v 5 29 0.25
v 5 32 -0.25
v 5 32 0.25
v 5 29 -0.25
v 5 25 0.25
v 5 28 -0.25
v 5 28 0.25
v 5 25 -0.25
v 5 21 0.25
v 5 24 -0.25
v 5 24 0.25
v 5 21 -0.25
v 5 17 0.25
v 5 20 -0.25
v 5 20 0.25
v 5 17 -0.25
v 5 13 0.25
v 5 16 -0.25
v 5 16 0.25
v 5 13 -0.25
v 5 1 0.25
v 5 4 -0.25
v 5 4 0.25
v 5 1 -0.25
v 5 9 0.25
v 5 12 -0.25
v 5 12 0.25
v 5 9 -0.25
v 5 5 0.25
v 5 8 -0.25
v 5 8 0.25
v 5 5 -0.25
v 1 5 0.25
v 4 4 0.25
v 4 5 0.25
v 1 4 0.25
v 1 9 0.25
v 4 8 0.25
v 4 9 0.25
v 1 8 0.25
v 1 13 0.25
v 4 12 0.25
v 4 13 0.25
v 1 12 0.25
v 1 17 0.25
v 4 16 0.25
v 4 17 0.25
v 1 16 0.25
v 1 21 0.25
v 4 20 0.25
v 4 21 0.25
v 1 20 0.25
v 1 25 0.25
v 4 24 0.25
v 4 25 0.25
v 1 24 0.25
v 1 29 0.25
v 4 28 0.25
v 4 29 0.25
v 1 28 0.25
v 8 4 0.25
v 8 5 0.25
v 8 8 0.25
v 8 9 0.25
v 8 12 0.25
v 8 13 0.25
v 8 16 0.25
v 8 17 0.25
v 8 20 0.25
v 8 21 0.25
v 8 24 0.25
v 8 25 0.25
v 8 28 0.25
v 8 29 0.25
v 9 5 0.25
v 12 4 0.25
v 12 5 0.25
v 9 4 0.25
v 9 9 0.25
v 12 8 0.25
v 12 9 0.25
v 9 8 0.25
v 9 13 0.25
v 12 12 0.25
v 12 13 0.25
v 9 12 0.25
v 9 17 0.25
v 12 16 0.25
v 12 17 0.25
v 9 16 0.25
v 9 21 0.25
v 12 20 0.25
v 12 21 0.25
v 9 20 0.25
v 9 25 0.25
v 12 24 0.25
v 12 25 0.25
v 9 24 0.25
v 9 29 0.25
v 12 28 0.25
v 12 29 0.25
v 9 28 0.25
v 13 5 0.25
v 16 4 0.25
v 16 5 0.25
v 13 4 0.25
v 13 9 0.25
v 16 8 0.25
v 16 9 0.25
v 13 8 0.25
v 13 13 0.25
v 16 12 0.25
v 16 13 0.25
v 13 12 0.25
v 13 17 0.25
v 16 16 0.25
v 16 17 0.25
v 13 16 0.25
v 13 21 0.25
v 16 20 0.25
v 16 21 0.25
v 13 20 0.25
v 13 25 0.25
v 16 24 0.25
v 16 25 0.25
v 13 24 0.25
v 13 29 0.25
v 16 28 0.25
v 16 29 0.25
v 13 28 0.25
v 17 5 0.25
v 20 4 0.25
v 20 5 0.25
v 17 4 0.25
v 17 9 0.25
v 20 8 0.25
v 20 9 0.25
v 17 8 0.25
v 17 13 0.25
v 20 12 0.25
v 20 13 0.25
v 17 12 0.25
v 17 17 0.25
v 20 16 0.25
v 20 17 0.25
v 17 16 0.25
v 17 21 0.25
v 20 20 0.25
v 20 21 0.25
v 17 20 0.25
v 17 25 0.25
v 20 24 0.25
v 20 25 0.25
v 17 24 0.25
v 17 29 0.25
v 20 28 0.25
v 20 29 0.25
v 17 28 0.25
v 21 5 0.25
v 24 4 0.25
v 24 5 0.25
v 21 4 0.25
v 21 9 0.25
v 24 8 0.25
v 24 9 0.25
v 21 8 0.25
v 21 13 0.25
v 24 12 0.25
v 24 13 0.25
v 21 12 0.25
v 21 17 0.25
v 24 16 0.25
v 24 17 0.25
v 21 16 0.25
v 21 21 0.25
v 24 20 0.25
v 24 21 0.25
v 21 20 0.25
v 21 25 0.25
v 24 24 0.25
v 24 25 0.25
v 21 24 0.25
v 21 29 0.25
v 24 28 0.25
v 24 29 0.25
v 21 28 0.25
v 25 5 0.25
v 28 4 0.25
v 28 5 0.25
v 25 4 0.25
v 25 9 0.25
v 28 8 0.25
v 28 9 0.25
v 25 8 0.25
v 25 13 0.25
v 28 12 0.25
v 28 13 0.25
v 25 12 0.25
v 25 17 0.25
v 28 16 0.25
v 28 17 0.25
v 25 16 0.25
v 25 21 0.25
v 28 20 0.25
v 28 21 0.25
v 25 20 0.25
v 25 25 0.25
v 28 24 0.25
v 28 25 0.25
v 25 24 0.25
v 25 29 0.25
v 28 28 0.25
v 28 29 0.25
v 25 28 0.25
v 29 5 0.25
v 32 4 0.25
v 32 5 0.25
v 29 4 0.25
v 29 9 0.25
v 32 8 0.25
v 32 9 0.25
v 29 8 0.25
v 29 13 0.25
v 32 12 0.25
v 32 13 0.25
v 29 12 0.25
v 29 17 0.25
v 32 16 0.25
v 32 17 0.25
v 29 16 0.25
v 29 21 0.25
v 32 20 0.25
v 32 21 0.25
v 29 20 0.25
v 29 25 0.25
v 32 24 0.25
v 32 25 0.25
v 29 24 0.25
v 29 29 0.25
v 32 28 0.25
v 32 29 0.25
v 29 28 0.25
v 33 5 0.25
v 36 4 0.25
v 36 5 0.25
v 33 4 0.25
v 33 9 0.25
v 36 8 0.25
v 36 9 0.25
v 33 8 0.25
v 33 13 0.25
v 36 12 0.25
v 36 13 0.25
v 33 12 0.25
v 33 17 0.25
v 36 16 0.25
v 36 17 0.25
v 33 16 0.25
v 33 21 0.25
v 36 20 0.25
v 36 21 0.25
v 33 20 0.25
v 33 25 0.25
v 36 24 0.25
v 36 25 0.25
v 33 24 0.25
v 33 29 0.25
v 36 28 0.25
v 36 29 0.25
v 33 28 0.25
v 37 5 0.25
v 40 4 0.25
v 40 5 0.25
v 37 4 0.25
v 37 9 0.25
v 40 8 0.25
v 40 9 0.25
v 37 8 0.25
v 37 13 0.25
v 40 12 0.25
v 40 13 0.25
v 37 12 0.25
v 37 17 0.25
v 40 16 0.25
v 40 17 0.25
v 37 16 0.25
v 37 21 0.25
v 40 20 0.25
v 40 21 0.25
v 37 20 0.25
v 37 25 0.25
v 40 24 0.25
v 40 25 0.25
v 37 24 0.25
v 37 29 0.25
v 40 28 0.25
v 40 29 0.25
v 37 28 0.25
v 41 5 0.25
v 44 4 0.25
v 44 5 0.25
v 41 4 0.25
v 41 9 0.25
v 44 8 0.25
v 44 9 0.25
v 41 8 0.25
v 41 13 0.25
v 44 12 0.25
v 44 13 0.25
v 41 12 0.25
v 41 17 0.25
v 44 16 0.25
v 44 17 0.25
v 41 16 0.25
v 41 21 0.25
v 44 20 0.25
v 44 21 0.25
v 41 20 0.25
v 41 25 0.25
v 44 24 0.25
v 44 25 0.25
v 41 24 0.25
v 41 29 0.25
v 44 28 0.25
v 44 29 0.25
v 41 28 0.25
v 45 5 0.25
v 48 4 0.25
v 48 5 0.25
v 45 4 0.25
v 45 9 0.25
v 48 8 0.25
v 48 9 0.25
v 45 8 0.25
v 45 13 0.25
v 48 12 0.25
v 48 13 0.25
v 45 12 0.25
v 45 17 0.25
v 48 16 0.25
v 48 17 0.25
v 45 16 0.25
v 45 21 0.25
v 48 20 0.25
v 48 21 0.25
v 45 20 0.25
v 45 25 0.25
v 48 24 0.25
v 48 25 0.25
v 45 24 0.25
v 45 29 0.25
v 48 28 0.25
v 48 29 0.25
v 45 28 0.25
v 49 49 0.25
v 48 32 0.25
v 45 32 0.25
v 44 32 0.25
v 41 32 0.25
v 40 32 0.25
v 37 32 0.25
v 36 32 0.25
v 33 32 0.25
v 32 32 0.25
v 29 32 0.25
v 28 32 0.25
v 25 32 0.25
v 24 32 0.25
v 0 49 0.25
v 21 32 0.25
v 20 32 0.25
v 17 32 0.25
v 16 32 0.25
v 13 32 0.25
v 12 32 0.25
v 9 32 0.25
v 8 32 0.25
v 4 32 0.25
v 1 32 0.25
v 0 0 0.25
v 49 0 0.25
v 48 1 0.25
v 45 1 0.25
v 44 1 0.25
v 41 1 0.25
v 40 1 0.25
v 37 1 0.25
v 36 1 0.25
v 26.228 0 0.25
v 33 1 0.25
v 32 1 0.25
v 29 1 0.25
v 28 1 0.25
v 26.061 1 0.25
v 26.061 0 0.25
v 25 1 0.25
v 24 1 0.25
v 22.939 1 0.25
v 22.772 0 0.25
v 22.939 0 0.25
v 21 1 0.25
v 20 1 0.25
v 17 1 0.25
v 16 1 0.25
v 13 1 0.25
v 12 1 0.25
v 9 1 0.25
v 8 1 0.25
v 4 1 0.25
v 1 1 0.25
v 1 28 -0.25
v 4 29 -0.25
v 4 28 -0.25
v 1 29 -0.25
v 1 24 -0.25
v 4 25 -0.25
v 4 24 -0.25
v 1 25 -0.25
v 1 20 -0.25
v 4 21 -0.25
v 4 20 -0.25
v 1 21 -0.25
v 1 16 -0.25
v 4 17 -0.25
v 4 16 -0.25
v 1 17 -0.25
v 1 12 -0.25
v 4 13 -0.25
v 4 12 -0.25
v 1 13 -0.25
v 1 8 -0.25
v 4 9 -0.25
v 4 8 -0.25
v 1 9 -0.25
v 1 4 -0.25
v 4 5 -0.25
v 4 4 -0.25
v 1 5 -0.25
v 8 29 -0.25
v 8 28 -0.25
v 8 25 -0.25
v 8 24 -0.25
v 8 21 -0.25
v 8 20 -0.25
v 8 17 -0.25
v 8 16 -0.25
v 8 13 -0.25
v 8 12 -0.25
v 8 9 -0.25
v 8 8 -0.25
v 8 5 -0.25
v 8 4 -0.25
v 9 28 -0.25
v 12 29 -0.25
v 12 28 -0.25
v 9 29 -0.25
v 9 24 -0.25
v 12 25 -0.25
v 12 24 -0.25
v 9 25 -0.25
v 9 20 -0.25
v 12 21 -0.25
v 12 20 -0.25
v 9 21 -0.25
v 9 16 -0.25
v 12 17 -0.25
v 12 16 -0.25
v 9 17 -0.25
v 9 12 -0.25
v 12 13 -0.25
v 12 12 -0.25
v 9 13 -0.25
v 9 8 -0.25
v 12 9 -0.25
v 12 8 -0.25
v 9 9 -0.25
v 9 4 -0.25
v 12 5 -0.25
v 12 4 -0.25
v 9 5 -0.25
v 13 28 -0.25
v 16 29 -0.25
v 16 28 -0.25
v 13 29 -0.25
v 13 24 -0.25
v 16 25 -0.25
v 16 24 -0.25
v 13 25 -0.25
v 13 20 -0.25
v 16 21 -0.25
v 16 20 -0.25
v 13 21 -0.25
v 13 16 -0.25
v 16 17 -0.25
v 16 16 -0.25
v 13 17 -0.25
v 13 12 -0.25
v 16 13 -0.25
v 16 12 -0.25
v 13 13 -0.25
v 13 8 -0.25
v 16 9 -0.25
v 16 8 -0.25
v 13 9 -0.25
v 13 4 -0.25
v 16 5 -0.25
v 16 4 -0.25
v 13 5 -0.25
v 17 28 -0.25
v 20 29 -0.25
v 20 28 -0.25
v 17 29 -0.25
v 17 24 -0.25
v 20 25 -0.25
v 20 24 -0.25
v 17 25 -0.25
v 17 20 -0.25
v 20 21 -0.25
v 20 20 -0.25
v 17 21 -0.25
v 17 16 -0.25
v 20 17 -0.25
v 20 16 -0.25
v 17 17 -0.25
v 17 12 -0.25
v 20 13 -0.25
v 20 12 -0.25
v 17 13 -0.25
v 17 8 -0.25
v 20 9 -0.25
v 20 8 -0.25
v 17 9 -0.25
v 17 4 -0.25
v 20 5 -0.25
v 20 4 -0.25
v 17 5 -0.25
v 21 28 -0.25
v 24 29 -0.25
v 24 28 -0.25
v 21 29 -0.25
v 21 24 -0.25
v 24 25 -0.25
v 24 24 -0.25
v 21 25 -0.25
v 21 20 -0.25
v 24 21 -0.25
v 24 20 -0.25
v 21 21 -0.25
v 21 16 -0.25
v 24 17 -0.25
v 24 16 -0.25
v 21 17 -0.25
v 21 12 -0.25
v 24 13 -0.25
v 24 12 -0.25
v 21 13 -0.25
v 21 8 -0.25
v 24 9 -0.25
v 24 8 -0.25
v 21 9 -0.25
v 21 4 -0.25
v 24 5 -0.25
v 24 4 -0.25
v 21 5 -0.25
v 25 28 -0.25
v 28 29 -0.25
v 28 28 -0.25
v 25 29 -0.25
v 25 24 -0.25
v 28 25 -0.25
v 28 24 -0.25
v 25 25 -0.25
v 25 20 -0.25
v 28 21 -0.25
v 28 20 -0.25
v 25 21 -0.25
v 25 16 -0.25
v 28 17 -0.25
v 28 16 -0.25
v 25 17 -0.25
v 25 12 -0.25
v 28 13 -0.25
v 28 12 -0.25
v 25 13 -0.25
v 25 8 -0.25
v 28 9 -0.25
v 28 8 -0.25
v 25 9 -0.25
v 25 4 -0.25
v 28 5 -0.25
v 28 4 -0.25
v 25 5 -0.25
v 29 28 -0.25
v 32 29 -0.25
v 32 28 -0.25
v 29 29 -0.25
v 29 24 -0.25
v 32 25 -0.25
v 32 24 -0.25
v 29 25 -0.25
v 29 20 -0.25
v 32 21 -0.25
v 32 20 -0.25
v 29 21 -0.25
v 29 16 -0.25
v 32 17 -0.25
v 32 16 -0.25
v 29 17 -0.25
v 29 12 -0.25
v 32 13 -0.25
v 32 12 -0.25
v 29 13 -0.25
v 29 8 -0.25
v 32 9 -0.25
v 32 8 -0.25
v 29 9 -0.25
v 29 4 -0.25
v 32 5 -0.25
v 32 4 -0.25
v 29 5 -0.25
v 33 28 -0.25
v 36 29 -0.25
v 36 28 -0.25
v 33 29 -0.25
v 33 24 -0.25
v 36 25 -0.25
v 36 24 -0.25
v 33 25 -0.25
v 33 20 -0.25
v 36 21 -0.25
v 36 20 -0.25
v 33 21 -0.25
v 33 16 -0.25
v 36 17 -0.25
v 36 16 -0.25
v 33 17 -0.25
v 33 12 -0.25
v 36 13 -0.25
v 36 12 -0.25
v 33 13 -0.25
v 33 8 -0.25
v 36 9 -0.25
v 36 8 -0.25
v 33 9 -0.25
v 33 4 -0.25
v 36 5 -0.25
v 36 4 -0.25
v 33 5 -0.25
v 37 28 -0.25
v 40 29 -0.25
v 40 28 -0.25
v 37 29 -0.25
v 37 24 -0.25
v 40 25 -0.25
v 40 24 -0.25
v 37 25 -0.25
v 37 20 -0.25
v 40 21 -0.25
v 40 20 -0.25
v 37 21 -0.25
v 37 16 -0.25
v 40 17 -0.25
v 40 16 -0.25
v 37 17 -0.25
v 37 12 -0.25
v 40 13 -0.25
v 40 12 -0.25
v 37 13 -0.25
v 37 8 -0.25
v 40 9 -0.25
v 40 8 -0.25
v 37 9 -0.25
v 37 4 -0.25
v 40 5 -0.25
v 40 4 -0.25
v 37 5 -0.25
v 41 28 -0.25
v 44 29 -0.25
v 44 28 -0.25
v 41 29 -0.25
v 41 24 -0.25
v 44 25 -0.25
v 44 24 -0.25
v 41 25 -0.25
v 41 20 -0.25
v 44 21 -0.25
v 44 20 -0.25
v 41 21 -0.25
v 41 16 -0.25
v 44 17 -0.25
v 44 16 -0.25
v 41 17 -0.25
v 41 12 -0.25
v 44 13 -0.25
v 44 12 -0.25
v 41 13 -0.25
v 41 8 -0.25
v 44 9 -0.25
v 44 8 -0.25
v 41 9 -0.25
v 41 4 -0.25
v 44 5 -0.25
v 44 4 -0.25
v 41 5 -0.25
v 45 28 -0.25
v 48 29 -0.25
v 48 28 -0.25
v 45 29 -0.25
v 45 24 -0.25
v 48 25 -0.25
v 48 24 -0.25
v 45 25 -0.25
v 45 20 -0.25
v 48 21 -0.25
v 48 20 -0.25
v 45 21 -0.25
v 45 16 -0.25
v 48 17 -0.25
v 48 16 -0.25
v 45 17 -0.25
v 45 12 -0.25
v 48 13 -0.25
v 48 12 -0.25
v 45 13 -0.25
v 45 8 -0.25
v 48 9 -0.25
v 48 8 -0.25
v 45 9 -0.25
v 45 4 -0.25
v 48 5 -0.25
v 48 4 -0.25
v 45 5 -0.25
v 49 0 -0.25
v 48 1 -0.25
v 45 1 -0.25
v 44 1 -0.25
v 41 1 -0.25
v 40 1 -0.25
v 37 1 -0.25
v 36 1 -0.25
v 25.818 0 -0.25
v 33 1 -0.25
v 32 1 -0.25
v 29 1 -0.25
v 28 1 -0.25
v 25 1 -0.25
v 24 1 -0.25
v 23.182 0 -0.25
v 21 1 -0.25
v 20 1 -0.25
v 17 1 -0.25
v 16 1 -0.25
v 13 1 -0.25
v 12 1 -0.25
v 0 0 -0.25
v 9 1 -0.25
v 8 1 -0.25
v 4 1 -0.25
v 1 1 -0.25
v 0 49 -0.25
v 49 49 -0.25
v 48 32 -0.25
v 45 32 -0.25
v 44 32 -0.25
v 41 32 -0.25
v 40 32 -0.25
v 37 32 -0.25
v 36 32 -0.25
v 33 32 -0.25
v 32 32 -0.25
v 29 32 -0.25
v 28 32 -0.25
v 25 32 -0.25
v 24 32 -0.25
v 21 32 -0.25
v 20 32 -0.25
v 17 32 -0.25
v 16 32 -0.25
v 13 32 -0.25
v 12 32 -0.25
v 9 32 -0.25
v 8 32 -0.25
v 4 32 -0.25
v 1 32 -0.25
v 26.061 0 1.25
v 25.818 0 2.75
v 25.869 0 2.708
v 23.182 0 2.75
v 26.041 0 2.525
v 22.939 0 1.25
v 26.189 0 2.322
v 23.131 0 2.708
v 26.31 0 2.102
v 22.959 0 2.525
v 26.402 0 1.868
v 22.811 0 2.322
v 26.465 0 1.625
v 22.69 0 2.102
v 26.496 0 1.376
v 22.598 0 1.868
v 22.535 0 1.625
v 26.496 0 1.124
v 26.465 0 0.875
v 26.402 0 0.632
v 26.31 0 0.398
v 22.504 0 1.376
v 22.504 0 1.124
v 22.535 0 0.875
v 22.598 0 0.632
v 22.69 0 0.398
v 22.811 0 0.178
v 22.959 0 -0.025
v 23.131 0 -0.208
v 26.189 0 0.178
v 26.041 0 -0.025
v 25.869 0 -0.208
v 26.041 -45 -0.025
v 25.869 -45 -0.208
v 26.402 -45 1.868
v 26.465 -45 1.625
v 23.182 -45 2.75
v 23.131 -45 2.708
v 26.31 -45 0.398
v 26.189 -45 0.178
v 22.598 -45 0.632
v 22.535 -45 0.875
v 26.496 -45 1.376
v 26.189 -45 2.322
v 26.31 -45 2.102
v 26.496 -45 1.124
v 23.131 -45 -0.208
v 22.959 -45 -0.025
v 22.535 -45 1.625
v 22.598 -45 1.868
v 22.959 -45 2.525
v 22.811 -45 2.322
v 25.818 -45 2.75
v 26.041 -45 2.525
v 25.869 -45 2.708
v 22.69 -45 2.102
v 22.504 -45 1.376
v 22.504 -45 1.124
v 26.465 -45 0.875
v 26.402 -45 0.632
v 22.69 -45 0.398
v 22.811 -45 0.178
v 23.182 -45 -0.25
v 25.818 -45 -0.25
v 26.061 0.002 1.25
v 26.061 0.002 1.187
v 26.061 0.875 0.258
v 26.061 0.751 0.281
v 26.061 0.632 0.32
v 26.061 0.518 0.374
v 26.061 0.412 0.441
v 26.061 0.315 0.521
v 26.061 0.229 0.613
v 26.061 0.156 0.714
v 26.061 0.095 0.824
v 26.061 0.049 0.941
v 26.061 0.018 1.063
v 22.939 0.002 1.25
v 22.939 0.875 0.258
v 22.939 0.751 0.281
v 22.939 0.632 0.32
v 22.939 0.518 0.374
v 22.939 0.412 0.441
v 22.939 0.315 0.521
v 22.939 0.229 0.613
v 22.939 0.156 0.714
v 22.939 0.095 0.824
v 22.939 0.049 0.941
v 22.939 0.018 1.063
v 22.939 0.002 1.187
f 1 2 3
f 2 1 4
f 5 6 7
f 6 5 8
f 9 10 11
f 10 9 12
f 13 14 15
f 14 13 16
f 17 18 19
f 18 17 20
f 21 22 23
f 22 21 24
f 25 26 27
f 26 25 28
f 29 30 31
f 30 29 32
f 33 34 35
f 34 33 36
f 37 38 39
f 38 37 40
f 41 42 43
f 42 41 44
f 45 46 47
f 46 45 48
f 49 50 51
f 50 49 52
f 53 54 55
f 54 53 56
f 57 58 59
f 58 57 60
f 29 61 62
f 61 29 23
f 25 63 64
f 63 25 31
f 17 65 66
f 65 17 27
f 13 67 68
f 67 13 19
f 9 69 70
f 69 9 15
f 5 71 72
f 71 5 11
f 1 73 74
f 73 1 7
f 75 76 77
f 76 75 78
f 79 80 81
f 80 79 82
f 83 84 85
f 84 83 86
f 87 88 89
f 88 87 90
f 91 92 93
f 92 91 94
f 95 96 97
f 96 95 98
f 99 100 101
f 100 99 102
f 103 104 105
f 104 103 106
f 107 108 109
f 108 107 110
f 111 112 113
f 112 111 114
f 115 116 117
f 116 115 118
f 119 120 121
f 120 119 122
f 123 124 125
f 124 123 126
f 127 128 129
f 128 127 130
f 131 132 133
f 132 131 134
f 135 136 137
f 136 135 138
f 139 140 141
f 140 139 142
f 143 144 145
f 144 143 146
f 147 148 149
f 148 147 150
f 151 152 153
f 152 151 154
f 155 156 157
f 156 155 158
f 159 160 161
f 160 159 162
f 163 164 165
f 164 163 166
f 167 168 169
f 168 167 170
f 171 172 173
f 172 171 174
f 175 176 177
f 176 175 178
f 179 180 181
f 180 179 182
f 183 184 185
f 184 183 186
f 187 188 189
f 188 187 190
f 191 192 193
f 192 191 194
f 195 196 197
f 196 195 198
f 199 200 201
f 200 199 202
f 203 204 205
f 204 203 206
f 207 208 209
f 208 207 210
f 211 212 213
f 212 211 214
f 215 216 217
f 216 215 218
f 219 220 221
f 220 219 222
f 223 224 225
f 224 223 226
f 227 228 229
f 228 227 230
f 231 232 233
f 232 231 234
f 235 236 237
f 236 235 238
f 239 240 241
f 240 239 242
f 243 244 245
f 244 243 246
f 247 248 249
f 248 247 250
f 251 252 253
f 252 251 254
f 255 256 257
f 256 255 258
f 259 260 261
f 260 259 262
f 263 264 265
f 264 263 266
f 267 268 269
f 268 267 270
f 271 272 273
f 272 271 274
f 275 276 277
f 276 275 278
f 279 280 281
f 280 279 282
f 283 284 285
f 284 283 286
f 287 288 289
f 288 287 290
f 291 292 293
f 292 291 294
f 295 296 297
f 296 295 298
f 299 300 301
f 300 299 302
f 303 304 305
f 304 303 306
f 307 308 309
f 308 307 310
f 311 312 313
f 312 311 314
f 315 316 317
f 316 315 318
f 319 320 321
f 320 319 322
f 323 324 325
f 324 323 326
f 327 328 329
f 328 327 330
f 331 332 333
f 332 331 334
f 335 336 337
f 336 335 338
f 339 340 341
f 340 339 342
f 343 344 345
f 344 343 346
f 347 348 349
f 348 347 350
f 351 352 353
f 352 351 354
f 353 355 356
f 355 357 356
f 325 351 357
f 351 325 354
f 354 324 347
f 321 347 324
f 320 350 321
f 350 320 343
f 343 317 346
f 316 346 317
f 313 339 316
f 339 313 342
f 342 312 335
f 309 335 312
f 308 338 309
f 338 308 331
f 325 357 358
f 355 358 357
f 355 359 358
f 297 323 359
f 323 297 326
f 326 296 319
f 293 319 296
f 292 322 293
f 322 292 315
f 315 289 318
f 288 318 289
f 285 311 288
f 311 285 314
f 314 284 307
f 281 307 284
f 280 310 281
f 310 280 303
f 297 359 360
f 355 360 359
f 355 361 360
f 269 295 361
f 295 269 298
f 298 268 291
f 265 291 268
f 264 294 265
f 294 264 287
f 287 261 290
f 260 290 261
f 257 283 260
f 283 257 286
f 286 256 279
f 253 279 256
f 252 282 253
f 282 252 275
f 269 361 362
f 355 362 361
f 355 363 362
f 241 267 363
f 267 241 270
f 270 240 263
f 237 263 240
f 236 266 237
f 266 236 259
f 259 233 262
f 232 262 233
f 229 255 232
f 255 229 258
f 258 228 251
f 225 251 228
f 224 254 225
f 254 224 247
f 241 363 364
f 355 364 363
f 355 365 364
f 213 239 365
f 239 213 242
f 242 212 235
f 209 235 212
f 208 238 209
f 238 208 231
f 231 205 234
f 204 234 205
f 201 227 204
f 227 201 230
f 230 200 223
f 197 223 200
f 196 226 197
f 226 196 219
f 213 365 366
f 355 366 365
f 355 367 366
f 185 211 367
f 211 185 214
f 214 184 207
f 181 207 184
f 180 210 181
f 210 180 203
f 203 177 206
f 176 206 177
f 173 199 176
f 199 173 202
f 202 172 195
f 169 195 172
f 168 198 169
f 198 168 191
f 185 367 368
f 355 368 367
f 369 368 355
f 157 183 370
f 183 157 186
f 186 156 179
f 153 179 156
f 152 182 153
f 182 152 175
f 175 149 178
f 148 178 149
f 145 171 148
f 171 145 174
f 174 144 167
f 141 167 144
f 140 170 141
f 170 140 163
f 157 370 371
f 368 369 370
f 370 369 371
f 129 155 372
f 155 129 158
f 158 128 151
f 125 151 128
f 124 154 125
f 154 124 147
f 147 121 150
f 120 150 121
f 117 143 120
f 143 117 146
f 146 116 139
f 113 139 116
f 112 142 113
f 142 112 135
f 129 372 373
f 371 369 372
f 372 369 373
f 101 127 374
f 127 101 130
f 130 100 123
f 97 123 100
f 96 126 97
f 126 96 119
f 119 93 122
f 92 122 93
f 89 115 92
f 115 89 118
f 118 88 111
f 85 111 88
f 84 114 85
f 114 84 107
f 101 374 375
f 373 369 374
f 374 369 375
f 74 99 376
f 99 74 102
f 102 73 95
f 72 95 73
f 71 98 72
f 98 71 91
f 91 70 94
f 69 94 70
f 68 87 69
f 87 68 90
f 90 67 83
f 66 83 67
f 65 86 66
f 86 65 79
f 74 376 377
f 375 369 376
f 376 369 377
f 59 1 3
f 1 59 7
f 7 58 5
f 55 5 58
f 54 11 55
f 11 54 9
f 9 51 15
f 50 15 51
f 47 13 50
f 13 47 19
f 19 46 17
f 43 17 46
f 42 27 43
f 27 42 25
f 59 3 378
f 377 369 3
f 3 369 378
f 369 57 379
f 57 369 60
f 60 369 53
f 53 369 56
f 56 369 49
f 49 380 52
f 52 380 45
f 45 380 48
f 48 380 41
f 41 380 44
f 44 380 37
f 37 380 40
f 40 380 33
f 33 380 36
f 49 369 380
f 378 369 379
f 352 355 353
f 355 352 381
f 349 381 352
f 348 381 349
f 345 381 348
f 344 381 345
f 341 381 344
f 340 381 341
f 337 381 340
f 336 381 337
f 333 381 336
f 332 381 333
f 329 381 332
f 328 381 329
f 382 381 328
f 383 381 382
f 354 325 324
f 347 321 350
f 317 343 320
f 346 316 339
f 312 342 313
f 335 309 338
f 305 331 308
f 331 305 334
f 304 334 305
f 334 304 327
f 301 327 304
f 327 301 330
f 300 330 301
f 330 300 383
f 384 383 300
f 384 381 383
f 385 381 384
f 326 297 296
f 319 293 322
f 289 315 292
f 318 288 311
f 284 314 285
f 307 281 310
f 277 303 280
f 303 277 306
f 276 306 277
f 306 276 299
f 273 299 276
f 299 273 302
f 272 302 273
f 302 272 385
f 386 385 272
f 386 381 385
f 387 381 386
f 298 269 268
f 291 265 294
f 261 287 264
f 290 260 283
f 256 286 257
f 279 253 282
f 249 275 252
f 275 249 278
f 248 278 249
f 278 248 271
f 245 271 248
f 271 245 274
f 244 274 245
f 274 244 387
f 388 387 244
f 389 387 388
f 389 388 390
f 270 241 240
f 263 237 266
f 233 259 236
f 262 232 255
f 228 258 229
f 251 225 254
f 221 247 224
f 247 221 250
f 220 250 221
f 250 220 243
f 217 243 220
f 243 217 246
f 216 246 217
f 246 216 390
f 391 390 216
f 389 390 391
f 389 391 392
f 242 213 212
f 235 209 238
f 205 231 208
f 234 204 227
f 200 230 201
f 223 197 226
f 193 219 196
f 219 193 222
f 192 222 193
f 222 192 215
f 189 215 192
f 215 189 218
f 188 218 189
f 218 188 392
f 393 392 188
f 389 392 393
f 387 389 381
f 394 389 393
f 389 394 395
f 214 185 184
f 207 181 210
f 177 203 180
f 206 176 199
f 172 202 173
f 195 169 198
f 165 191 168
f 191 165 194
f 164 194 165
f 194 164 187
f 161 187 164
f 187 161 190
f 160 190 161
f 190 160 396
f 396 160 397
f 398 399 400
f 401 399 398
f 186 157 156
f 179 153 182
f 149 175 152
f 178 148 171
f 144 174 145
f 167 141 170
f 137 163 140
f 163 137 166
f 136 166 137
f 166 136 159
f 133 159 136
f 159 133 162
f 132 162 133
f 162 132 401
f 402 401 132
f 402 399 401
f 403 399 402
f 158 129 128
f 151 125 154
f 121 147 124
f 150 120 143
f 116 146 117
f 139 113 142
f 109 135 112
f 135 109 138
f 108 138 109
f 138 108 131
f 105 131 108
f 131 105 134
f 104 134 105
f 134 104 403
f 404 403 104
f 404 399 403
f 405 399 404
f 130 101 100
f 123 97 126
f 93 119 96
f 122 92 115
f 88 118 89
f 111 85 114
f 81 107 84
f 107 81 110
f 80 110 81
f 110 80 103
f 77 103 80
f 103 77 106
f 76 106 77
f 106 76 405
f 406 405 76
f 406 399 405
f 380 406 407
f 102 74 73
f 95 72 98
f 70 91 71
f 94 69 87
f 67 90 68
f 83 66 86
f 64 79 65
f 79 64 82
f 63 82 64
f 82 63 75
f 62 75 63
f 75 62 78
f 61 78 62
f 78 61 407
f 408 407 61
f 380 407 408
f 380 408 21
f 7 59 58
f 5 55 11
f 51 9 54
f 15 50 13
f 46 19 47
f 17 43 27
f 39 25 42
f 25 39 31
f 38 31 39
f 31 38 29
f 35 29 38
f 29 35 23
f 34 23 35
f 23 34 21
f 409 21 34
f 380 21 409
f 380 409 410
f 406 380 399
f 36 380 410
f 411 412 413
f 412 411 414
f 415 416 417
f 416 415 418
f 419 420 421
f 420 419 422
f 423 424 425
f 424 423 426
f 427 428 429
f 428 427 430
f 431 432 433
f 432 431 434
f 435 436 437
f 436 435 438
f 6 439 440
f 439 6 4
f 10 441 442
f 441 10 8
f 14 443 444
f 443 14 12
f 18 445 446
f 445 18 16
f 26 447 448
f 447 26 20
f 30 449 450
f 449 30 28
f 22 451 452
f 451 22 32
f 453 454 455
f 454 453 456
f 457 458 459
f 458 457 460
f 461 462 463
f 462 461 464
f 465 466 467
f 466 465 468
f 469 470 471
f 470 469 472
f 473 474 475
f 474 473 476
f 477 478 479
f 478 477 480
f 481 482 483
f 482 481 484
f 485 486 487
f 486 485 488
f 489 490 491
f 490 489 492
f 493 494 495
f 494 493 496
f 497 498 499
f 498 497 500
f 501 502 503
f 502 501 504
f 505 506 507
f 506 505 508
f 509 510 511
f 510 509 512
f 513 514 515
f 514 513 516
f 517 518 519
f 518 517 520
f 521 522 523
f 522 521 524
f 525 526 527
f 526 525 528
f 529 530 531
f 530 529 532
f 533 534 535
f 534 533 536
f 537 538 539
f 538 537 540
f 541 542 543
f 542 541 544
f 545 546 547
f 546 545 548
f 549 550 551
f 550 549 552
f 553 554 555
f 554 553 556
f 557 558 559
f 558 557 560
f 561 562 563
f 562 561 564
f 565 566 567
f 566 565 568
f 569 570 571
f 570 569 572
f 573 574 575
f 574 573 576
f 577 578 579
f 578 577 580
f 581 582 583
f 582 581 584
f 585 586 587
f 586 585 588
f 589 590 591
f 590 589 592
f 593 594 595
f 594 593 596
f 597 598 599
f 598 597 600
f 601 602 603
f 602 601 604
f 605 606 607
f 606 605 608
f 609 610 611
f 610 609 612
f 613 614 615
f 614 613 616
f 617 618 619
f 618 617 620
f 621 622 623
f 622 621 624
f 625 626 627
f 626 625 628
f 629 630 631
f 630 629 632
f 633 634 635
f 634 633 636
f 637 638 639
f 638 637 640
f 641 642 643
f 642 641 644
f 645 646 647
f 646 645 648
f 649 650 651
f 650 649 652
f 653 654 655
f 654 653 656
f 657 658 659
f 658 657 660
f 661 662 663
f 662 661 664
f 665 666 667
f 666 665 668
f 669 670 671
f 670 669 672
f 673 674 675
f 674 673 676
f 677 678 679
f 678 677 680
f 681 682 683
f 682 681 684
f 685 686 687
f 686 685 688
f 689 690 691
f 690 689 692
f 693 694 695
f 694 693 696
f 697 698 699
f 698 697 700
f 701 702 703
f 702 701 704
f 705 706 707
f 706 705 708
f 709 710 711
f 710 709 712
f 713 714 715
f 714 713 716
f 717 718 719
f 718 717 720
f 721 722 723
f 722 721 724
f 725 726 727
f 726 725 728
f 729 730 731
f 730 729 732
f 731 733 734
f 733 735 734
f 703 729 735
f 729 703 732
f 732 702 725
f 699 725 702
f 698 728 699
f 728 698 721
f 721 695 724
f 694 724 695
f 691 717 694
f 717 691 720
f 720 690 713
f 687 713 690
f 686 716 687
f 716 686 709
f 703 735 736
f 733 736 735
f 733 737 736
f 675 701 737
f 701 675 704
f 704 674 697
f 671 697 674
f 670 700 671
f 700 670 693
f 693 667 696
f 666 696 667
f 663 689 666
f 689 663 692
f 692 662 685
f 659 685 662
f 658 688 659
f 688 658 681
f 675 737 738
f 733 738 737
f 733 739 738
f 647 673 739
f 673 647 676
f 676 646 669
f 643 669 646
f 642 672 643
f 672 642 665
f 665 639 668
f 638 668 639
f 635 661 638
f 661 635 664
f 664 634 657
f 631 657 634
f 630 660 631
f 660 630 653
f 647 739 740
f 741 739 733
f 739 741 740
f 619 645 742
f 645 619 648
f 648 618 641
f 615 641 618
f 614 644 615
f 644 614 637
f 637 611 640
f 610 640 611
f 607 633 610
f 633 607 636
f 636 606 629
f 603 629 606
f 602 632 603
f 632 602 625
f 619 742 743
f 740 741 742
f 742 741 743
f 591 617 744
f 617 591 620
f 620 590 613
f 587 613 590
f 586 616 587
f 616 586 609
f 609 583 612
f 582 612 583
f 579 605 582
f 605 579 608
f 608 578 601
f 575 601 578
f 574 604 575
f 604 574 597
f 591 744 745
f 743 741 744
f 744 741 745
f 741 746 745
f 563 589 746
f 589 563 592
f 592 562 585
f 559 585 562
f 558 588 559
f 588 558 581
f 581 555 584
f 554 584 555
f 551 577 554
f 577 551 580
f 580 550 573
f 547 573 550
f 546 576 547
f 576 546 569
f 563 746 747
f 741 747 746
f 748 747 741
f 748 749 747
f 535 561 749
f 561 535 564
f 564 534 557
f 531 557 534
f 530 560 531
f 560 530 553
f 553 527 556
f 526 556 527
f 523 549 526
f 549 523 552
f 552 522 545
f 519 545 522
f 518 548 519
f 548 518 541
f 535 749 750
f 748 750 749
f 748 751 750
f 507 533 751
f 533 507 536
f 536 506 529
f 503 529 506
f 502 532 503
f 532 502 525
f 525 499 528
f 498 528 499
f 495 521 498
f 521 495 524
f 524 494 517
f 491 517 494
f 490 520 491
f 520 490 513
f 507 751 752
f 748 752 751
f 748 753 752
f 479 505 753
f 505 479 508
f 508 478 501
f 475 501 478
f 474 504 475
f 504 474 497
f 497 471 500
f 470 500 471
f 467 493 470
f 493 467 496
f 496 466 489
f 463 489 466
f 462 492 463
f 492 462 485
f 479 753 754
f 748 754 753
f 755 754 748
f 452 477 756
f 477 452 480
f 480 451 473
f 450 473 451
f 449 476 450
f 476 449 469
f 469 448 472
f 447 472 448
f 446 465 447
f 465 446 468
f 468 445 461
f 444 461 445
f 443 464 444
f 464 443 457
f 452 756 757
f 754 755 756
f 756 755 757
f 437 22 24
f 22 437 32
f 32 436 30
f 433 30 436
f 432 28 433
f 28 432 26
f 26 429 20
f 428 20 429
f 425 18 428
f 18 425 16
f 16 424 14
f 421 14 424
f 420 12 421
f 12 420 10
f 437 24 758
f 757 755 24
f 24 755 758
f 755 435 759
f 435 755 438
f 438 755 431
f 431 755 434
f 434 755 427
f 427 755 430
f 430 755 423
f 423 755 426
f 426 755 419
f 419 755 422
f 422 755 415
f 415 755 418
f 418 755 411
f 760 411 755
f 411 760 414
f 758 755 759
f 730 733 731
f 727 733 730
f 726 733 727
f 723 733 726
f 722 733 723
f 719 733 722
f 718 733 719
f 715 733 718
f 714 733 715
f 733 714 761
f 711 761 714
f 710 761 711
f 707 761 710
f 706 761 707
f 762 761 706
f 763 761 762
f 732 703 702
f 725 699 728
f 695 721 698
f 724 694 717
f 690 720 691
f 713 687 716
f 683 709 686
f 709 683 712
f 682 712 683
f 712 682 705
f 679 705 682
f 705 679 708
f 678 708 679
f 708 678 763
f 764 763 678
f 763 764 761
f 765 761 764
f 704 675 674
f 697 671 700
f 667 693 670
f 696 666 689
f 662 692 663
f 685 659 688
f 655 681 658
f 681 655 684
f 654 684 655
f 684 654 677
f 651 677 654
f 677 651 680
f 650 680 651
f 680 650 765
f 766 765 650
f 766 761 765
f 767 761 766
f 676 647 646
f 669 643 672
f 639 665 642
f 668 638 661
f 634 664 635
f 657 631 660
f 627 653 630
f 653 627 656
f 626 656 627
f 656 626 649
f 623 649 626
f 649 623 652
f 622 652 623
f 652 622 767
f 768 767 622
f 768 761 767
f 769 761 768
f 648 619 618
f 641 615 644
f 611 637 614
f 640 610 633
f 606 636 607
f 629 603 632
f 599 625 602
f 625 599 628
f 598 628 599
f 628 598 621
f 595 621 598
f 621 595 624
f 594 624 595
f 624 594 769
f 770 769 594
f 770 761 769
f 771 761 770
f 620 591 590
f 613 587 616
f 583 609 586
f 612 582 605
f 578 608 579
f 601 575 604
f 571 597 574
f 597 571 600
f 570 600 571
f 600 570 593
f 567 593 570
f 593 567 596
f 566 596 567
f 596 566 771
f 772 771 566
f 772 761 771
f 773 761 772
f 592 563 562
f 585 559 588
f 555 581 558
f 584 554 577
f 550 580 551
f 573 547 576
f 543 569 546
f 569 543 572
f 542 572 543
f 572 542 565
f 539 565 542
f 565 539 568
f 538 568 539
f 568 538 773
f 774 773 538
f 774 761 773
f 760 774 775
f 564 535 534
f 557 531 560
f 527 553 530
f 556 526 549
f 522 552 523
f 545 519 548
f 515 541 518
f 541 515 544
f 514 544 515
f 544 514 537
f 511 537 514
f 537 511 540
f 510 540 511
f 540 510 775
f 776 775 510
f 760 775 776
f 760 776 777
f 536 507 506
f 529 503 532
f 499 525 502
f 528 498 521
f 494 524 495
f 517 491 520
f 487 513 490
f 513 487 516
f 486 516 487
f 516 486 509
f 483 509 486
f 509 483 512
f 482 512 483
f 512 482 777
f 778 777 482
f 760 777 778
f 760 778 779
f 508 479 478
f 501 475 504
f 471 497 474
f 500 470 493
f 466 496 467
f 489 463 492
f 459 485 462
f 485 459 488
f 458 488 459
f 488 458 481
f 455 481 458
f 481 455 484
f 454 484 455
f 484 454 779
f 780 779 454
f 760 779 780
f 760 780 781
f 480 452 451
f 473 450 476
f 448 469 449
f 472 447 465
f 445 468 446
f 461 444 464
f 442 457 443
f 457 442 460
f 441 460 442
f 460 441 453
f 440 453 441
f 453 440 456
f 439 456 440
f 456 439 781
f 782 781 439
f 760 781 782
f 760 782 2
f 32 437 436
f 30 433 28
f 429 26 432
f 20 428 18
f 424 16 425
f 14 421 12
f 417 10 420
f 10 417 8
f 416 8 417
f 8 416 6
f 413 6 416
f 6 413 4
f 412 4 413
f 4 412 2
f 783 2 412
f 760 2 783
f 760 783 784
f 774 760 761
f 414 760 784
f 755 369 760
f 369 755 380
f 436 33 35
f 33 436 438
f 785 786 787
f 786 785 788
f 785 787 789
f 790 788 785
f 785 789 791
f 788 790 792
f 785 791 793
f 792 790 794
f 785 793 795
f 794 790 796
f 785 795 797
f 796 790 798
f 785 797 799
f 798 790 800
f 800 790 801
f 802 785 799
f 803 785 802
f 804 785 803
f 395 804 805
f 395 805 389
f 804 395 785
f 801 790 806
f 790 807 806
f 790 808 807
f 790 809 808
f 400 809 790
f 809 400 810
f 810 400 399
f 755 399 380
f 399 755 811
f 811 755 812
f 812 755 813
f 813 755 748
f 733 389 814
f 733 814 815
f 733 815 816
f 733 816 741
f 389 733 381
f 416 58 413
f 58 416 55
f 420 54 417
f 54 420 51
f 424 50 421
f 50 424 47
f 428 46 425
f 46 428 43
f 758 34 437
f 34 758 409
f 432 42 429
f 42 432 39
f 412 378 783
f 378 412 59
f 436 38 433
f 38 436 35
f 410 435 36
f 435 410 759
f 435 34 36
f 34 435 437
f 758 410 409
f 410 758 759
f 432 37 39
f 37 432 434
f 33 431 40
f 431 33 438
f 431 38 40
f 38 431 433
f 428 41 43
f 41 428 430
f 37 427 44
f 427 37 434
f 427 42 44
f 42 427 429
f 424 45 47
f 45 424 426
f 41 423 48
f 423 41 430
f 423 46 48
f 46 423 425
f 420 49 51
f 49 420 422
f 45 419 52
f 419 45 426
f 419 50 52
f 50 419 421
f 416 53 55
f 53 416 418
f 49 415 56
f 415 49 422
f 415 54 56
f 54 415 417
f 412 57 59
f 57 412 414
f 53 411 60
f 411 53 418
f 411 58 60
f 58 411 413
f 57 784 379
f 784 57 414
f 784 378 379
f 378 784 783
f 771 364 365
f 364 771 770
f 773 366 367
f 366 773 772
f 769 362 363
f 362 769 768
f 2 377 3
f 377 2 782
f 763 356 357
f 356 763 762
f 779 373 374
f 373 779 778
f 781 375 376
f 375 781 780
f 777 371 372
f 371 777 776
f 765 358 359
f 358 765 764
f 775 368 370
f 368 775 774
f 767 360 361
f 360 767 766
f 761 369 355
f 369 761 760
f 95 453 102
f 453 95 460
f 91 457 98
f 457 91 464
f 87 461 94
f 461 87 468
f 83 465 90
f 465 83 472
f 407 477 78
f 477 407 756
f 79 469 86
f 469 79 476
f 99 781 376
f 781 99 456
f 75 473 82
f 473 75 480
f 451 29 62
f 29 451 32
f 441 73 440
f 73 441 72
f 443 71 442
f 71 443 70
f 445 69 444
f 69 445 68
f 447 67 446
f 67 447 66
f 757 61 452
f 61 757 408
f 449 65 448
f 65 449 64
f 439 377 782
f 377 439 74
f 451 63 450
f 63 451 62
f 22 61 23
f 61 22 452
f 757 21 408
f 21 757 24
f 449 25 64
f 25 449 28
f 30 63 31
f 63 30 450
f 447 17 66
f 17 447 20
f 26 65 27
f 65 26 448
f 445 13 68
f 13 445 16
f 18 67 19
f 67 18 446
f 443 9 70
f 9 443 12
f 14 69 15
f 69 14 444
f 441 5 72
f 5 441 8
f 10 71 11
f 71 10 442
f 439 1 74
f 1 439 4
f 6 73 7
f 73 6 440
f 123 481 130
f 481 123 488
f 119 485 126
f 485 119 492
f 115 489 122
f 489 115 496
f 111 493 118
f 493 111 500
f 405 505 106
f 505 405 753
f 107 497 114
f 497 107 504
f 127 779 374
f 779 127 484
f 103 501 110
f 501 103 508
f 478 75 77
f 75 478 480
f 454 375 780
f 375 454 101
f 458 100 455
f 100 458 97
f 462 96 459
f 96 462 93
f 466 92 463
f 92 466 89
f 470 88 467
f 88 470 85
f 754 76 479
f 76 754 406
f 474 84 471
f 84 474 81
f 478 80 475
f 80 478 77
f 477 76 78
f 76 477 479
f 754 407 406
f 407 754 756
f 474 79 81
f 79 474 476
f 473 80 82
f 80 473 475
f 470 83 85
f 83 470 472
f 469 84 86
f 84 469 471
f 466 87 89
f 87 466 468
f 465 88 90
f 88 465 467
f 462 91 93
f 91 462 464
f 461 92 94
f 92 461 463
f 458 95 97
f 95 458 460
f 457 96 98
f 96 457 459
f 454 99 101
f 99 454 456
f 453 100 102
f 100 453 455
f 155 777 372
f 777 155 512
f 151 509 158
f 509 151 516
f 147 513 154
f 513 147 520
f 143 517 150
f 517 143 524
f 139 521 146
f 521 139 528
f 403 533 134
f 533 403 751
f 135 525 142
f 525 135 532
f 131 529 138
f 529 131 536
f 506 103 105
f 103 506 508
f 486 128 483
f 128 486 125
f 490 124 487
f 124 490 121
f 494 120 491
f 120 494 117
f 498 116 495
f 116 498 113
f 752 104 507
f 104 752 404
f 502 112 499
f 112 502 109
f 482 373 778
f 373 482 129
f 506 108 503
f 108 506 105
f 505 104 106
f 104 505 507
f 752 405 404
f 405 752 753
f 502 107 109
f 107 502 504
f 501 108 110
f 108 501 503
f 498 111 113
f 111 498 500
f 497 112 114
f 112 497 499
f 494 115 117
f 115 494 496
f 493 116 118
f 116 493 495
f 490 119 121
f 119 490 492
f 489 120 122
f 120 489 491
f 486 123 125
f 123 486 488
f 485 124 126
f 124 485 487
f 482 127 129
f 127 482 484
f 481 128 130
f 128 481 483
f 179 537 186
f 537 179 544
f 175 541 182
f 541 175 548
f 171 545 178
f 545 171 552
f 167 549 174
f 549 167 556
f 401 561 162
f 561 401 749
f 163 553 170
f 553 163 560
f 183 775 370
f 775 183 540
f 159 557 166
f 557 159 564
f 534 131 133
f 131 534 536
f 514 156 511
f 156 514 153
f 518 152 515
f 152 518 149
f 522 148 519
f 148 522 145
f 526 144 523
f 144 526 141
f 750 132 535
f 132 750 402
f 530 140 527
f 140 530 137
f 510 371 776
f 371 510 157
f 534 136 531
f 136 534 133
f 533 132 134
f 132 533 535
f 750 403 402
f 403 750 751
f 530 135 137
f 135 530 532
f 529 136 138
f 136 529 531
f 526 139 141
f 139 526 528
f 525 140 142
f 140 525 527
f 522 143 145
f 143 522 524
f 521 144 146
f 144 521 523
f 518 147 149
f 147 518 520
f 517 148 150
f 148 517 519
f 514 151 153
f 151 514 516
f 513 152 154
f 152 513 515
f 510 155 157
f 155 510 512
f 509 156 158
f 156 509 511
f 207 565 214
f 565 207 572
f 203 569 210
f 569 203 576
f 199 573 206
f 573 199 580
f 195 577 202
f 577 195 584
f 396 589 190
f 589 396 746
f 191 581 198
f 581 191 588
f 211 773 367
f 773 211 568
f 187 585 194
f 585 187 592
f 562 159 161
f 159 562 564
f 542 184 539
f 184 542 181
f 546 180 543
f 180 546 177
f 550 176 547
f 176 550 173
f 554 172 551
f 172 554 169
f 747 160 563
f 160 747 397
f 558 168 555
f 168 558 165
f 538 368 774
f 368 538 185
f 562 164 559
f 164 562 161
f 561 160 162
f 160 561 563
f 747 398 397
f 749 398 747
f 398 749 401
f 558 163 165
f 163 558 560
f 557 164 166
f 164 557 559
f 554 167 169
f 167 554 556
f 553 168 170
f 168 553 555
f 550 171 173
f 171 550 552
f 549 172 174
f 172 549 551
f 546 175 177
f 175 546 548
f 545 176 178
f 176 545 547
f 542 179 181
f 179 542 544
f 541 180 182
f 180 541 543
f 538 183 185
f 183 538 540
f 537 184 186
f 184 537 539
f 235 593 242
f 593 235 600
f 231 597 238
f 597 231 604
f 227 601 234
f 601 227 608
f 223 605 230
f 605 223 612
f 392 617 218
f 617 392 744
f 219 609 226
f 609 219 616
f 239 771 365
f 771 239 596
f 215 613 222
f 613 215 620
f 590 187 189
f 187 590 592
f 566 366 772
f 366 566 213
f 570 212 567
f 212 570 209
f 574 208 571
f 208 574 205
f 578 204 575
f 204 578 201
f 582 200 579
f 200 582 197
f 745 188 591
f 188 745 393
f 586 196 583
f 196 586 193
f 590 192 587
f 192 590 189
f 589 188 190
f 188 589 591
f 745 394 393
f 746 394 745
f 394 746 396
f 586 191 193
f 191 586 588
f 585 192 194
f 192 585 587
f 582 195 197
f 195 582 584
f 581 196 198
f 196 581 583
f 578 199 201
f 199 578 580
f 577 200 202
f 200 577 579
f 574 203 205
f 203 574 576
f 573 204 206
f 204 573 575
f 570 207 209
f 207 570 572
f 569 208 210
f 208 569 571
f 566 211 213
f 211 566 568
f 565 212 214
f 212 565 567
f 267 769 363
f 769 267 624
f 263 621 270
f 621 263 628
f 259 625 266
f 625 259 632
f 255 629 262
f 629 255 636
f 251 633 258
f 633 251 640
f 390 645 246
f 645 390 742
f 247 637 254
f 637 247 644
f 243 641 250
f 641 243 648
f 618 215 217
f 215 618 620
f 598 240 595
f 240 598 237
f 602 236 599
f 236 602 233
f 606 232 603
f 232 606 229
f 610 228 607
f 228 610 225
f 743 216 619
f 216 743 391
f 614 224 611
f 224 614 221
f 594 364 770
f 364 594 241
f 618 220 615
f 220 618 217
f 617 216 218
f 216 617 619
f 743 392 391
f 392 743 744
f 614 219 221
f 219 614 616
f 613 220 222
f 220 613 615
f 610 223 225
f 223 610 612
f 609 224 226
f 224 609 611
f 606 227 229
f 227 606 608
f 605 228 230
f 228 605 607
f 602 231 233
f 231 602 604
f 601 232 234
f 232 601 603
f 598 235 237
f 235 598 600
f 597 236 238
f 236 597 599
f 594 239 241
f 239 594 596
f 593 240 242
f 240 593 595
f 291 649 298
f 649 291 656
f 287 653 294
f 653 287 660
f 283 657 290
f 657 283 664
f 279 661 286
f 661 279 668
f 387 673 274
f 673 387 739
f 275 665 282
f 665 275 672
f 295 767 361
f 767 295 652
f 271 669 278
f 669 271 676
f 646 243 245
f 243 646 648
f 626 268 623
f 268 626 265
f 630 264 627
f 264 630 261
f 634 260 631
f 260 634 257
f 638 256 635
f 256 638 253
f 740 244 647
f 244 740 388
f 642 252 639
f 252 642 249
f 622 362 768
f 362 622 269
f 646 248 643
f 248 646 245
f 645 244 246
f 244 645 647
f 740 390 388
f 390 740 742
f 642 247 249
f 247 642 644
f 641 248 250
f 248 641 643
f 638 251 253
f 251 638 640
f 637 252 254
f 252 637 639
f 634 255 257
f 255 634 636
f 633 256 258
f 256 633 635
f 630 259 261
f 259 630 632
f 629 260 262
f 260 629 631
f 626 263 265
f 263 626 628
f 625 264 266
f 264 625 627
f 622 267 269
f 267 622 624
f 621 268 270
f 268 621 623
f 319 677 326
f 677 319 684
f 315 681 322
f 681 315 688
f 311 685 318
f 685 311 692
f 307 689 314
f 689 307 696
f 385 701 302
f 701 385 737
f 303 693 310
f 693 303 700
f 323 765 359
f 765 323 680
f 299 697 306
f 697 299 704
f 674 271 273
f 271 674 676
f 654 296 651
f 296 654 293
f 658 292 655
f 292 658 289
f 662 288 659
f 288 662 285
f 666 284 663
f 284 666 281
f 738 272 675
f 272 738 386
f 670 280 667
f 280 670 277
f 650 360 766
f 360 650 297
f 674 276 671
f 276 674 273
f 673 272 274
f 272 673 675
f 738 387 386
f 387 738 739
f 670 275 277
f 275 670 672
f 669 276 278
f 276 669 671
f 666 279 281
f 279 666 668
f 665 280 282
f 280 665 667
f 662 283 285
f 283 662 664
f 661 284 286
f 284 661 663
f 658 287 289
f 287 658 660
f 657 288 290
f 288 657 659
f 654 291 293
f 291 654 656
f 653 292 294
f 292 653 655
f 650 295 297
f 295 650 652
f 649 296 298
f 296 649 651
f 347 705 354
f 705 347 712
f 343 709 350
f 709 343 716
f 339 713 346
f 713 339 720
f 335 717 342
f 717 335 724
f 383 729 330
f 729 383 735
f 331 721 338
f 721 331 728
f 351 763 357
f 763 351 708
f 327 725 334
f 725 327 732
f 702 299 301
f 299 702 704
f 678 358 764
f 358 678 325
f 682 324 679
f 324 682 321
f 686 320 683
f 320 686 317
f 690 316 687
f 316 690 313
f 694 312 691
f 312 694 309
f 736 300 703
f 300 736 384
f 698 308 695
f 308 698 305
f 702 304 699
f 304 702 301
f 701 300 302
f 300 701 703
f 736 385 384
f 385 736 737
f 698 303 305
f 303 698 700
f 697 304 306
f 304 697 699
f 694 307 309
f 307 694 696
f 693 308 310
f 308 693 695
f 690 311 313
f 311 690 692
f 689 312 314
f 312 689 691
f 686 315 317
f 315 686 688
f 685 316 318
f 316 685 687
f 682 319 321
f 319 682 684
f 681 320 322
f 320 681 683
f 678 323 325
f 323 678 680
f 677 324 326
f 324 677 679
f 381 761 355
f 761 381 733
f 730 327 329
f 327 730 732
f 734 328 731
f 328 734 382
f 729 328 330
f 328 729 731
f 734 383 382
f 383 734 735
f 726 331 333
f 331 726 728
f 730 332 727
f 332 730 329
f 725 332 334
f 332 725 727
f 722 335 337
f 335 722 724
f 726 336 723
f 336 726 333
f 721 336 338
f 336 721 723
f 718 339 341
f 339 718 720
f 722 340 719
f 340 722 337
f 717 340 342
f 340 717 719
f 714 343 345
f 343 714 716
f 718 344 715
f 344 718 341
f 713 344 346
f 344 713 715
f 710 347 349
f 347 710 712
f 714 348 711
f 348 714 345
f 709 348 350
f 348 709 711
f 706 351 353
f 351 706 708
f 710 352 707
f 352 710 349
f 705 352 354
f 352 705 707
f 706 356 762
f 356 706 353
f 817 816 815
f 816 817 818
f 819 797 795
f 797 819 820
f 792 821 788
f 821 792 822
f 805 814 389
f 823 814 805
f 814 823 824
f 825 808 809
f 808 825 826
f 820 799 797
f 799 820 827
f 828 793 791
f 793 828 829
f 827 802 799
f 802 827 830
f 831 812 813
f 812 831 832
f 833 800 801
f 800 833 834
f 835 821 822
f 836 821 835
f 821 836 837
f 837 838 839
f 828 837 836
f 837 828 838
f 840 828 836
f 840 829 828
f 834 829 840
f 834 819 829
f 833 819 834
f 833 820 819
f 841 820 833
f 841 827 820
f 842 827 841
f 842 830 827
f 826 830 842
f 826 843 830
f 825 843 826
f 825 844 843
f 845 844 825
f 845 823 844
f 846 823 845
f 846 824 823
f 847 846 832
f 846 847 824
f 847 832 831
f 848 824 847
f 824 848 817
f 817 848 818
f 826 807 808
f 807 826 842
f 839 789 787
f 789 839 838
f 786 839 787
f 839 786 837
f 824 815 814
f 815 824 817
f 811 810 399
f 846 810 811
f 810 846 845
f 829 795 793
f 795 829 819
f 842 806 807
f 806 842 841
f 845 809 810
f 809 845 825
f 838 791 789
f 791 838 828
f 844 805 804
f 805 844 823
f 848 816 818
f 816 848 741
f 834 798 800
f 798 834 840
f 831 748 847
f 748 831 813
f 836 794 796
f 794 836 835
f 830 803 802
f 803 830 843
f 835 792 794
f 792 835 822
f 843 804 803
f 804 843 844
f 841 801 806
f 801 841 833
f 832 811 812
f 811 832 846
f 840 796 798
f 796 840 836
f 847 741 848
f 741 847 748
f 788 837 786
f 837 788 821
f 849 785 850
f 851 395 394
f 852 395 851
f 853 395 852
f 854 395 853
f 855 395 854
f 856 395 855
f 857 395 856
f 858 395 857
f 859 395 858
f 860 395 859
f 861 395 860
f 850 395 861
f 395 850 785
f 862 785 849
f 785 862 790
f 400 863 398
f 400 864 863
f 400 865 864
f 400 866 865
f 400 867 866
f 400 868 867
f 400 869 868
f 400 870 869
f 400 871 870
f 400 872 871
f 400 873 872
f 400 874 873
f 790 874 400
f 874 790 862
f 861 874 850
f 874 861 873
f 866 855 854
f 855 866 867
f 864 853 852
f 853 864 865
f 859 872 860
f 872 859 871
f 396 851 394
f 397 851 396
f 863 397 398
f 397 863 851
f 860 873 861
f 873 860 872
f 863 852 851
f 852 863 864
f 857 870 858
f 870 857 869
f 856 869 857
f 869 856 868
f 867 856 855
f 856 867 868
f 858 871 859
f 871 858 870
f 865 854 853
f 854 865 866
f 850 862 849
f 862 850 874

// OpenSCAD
gridSize = 5;
gridHole = 3;
gridWidth = 12;
griddedLength = 8;
ungriddedLength = 4;
gridThickness = 0.5;

handleHeight = 45;
handleDiameter = 4;


module grid(bGrid) {
    difference() {
        cube([gridSize,gridSize,gridThickness],center=true);
        if (bGrid==true) {
            cube([gridHole,gridHole,gridThickness+0.1],center=true);
        }
    }
}
translate([-gridHole/2,-gridHole/2,0])
for (i=[1:gridWidth]) {
    for (j=[1:griddedLength]) {
        translate([(gridSize)*i-(gridSize-gridHole)/2*i,(gridSize)*j-(gridSize-gridHole)/2*j,0])
        grid(true);
    }
    if (ungriddedLength > 0) {
        for (j=[griddedLength+1:griddedLength+ungriddedLength]) {
            translate([(gridSize)*i-(gridSize-gridHole)/2*i,(gridSize)*j-(gridSize-gridHole)/2*j,0])
            grid(false);
        }
    }
}

$fn=50;
gridEdge = (gridSize-gridHole)/2;
echo(gridEdge);
modelWidth = (gridSize-(gridSize-gridHole)/2)*(gridWidth-1)+gridSize;
translate([modelWidth/2,-handleHeight/2,handleDiameter/2-handleDiameter/8-gridThickness/2])
rotate([90,90,0])
difference() {
    cylinder(d=handleDiameter, h=handleHeight, center=true);
    translate([7*handleDiameter/8,0,0])
    cube([handleDiameter,handleDiameter,handleHeight+1],center=true);
    translate([-7*handleDiameter/8,0,0])
    cube([handleDiameter,handleDiameter,handleHeight+1],center=true);
}

handleRadius = handleDiameter/2;
filletLength = 2*sqrt(pow(handleRadius,2)-pow(5*handleRadius/8,2));
filletSize = gridEdge>handleRadius?handleRadius:gridEdge;
translate([modelWidth/2,filletSize/2,filletSize/2+gridThickness/2])
difference() {
    cube([filletLength,filletSize,filletSize],center=true);
    translate([0,filletSize/2,filletSize/2])
    rotate([0,90,0])
    cylinder(h=filletLength+1,d=filletSize*2,center=true);
}
